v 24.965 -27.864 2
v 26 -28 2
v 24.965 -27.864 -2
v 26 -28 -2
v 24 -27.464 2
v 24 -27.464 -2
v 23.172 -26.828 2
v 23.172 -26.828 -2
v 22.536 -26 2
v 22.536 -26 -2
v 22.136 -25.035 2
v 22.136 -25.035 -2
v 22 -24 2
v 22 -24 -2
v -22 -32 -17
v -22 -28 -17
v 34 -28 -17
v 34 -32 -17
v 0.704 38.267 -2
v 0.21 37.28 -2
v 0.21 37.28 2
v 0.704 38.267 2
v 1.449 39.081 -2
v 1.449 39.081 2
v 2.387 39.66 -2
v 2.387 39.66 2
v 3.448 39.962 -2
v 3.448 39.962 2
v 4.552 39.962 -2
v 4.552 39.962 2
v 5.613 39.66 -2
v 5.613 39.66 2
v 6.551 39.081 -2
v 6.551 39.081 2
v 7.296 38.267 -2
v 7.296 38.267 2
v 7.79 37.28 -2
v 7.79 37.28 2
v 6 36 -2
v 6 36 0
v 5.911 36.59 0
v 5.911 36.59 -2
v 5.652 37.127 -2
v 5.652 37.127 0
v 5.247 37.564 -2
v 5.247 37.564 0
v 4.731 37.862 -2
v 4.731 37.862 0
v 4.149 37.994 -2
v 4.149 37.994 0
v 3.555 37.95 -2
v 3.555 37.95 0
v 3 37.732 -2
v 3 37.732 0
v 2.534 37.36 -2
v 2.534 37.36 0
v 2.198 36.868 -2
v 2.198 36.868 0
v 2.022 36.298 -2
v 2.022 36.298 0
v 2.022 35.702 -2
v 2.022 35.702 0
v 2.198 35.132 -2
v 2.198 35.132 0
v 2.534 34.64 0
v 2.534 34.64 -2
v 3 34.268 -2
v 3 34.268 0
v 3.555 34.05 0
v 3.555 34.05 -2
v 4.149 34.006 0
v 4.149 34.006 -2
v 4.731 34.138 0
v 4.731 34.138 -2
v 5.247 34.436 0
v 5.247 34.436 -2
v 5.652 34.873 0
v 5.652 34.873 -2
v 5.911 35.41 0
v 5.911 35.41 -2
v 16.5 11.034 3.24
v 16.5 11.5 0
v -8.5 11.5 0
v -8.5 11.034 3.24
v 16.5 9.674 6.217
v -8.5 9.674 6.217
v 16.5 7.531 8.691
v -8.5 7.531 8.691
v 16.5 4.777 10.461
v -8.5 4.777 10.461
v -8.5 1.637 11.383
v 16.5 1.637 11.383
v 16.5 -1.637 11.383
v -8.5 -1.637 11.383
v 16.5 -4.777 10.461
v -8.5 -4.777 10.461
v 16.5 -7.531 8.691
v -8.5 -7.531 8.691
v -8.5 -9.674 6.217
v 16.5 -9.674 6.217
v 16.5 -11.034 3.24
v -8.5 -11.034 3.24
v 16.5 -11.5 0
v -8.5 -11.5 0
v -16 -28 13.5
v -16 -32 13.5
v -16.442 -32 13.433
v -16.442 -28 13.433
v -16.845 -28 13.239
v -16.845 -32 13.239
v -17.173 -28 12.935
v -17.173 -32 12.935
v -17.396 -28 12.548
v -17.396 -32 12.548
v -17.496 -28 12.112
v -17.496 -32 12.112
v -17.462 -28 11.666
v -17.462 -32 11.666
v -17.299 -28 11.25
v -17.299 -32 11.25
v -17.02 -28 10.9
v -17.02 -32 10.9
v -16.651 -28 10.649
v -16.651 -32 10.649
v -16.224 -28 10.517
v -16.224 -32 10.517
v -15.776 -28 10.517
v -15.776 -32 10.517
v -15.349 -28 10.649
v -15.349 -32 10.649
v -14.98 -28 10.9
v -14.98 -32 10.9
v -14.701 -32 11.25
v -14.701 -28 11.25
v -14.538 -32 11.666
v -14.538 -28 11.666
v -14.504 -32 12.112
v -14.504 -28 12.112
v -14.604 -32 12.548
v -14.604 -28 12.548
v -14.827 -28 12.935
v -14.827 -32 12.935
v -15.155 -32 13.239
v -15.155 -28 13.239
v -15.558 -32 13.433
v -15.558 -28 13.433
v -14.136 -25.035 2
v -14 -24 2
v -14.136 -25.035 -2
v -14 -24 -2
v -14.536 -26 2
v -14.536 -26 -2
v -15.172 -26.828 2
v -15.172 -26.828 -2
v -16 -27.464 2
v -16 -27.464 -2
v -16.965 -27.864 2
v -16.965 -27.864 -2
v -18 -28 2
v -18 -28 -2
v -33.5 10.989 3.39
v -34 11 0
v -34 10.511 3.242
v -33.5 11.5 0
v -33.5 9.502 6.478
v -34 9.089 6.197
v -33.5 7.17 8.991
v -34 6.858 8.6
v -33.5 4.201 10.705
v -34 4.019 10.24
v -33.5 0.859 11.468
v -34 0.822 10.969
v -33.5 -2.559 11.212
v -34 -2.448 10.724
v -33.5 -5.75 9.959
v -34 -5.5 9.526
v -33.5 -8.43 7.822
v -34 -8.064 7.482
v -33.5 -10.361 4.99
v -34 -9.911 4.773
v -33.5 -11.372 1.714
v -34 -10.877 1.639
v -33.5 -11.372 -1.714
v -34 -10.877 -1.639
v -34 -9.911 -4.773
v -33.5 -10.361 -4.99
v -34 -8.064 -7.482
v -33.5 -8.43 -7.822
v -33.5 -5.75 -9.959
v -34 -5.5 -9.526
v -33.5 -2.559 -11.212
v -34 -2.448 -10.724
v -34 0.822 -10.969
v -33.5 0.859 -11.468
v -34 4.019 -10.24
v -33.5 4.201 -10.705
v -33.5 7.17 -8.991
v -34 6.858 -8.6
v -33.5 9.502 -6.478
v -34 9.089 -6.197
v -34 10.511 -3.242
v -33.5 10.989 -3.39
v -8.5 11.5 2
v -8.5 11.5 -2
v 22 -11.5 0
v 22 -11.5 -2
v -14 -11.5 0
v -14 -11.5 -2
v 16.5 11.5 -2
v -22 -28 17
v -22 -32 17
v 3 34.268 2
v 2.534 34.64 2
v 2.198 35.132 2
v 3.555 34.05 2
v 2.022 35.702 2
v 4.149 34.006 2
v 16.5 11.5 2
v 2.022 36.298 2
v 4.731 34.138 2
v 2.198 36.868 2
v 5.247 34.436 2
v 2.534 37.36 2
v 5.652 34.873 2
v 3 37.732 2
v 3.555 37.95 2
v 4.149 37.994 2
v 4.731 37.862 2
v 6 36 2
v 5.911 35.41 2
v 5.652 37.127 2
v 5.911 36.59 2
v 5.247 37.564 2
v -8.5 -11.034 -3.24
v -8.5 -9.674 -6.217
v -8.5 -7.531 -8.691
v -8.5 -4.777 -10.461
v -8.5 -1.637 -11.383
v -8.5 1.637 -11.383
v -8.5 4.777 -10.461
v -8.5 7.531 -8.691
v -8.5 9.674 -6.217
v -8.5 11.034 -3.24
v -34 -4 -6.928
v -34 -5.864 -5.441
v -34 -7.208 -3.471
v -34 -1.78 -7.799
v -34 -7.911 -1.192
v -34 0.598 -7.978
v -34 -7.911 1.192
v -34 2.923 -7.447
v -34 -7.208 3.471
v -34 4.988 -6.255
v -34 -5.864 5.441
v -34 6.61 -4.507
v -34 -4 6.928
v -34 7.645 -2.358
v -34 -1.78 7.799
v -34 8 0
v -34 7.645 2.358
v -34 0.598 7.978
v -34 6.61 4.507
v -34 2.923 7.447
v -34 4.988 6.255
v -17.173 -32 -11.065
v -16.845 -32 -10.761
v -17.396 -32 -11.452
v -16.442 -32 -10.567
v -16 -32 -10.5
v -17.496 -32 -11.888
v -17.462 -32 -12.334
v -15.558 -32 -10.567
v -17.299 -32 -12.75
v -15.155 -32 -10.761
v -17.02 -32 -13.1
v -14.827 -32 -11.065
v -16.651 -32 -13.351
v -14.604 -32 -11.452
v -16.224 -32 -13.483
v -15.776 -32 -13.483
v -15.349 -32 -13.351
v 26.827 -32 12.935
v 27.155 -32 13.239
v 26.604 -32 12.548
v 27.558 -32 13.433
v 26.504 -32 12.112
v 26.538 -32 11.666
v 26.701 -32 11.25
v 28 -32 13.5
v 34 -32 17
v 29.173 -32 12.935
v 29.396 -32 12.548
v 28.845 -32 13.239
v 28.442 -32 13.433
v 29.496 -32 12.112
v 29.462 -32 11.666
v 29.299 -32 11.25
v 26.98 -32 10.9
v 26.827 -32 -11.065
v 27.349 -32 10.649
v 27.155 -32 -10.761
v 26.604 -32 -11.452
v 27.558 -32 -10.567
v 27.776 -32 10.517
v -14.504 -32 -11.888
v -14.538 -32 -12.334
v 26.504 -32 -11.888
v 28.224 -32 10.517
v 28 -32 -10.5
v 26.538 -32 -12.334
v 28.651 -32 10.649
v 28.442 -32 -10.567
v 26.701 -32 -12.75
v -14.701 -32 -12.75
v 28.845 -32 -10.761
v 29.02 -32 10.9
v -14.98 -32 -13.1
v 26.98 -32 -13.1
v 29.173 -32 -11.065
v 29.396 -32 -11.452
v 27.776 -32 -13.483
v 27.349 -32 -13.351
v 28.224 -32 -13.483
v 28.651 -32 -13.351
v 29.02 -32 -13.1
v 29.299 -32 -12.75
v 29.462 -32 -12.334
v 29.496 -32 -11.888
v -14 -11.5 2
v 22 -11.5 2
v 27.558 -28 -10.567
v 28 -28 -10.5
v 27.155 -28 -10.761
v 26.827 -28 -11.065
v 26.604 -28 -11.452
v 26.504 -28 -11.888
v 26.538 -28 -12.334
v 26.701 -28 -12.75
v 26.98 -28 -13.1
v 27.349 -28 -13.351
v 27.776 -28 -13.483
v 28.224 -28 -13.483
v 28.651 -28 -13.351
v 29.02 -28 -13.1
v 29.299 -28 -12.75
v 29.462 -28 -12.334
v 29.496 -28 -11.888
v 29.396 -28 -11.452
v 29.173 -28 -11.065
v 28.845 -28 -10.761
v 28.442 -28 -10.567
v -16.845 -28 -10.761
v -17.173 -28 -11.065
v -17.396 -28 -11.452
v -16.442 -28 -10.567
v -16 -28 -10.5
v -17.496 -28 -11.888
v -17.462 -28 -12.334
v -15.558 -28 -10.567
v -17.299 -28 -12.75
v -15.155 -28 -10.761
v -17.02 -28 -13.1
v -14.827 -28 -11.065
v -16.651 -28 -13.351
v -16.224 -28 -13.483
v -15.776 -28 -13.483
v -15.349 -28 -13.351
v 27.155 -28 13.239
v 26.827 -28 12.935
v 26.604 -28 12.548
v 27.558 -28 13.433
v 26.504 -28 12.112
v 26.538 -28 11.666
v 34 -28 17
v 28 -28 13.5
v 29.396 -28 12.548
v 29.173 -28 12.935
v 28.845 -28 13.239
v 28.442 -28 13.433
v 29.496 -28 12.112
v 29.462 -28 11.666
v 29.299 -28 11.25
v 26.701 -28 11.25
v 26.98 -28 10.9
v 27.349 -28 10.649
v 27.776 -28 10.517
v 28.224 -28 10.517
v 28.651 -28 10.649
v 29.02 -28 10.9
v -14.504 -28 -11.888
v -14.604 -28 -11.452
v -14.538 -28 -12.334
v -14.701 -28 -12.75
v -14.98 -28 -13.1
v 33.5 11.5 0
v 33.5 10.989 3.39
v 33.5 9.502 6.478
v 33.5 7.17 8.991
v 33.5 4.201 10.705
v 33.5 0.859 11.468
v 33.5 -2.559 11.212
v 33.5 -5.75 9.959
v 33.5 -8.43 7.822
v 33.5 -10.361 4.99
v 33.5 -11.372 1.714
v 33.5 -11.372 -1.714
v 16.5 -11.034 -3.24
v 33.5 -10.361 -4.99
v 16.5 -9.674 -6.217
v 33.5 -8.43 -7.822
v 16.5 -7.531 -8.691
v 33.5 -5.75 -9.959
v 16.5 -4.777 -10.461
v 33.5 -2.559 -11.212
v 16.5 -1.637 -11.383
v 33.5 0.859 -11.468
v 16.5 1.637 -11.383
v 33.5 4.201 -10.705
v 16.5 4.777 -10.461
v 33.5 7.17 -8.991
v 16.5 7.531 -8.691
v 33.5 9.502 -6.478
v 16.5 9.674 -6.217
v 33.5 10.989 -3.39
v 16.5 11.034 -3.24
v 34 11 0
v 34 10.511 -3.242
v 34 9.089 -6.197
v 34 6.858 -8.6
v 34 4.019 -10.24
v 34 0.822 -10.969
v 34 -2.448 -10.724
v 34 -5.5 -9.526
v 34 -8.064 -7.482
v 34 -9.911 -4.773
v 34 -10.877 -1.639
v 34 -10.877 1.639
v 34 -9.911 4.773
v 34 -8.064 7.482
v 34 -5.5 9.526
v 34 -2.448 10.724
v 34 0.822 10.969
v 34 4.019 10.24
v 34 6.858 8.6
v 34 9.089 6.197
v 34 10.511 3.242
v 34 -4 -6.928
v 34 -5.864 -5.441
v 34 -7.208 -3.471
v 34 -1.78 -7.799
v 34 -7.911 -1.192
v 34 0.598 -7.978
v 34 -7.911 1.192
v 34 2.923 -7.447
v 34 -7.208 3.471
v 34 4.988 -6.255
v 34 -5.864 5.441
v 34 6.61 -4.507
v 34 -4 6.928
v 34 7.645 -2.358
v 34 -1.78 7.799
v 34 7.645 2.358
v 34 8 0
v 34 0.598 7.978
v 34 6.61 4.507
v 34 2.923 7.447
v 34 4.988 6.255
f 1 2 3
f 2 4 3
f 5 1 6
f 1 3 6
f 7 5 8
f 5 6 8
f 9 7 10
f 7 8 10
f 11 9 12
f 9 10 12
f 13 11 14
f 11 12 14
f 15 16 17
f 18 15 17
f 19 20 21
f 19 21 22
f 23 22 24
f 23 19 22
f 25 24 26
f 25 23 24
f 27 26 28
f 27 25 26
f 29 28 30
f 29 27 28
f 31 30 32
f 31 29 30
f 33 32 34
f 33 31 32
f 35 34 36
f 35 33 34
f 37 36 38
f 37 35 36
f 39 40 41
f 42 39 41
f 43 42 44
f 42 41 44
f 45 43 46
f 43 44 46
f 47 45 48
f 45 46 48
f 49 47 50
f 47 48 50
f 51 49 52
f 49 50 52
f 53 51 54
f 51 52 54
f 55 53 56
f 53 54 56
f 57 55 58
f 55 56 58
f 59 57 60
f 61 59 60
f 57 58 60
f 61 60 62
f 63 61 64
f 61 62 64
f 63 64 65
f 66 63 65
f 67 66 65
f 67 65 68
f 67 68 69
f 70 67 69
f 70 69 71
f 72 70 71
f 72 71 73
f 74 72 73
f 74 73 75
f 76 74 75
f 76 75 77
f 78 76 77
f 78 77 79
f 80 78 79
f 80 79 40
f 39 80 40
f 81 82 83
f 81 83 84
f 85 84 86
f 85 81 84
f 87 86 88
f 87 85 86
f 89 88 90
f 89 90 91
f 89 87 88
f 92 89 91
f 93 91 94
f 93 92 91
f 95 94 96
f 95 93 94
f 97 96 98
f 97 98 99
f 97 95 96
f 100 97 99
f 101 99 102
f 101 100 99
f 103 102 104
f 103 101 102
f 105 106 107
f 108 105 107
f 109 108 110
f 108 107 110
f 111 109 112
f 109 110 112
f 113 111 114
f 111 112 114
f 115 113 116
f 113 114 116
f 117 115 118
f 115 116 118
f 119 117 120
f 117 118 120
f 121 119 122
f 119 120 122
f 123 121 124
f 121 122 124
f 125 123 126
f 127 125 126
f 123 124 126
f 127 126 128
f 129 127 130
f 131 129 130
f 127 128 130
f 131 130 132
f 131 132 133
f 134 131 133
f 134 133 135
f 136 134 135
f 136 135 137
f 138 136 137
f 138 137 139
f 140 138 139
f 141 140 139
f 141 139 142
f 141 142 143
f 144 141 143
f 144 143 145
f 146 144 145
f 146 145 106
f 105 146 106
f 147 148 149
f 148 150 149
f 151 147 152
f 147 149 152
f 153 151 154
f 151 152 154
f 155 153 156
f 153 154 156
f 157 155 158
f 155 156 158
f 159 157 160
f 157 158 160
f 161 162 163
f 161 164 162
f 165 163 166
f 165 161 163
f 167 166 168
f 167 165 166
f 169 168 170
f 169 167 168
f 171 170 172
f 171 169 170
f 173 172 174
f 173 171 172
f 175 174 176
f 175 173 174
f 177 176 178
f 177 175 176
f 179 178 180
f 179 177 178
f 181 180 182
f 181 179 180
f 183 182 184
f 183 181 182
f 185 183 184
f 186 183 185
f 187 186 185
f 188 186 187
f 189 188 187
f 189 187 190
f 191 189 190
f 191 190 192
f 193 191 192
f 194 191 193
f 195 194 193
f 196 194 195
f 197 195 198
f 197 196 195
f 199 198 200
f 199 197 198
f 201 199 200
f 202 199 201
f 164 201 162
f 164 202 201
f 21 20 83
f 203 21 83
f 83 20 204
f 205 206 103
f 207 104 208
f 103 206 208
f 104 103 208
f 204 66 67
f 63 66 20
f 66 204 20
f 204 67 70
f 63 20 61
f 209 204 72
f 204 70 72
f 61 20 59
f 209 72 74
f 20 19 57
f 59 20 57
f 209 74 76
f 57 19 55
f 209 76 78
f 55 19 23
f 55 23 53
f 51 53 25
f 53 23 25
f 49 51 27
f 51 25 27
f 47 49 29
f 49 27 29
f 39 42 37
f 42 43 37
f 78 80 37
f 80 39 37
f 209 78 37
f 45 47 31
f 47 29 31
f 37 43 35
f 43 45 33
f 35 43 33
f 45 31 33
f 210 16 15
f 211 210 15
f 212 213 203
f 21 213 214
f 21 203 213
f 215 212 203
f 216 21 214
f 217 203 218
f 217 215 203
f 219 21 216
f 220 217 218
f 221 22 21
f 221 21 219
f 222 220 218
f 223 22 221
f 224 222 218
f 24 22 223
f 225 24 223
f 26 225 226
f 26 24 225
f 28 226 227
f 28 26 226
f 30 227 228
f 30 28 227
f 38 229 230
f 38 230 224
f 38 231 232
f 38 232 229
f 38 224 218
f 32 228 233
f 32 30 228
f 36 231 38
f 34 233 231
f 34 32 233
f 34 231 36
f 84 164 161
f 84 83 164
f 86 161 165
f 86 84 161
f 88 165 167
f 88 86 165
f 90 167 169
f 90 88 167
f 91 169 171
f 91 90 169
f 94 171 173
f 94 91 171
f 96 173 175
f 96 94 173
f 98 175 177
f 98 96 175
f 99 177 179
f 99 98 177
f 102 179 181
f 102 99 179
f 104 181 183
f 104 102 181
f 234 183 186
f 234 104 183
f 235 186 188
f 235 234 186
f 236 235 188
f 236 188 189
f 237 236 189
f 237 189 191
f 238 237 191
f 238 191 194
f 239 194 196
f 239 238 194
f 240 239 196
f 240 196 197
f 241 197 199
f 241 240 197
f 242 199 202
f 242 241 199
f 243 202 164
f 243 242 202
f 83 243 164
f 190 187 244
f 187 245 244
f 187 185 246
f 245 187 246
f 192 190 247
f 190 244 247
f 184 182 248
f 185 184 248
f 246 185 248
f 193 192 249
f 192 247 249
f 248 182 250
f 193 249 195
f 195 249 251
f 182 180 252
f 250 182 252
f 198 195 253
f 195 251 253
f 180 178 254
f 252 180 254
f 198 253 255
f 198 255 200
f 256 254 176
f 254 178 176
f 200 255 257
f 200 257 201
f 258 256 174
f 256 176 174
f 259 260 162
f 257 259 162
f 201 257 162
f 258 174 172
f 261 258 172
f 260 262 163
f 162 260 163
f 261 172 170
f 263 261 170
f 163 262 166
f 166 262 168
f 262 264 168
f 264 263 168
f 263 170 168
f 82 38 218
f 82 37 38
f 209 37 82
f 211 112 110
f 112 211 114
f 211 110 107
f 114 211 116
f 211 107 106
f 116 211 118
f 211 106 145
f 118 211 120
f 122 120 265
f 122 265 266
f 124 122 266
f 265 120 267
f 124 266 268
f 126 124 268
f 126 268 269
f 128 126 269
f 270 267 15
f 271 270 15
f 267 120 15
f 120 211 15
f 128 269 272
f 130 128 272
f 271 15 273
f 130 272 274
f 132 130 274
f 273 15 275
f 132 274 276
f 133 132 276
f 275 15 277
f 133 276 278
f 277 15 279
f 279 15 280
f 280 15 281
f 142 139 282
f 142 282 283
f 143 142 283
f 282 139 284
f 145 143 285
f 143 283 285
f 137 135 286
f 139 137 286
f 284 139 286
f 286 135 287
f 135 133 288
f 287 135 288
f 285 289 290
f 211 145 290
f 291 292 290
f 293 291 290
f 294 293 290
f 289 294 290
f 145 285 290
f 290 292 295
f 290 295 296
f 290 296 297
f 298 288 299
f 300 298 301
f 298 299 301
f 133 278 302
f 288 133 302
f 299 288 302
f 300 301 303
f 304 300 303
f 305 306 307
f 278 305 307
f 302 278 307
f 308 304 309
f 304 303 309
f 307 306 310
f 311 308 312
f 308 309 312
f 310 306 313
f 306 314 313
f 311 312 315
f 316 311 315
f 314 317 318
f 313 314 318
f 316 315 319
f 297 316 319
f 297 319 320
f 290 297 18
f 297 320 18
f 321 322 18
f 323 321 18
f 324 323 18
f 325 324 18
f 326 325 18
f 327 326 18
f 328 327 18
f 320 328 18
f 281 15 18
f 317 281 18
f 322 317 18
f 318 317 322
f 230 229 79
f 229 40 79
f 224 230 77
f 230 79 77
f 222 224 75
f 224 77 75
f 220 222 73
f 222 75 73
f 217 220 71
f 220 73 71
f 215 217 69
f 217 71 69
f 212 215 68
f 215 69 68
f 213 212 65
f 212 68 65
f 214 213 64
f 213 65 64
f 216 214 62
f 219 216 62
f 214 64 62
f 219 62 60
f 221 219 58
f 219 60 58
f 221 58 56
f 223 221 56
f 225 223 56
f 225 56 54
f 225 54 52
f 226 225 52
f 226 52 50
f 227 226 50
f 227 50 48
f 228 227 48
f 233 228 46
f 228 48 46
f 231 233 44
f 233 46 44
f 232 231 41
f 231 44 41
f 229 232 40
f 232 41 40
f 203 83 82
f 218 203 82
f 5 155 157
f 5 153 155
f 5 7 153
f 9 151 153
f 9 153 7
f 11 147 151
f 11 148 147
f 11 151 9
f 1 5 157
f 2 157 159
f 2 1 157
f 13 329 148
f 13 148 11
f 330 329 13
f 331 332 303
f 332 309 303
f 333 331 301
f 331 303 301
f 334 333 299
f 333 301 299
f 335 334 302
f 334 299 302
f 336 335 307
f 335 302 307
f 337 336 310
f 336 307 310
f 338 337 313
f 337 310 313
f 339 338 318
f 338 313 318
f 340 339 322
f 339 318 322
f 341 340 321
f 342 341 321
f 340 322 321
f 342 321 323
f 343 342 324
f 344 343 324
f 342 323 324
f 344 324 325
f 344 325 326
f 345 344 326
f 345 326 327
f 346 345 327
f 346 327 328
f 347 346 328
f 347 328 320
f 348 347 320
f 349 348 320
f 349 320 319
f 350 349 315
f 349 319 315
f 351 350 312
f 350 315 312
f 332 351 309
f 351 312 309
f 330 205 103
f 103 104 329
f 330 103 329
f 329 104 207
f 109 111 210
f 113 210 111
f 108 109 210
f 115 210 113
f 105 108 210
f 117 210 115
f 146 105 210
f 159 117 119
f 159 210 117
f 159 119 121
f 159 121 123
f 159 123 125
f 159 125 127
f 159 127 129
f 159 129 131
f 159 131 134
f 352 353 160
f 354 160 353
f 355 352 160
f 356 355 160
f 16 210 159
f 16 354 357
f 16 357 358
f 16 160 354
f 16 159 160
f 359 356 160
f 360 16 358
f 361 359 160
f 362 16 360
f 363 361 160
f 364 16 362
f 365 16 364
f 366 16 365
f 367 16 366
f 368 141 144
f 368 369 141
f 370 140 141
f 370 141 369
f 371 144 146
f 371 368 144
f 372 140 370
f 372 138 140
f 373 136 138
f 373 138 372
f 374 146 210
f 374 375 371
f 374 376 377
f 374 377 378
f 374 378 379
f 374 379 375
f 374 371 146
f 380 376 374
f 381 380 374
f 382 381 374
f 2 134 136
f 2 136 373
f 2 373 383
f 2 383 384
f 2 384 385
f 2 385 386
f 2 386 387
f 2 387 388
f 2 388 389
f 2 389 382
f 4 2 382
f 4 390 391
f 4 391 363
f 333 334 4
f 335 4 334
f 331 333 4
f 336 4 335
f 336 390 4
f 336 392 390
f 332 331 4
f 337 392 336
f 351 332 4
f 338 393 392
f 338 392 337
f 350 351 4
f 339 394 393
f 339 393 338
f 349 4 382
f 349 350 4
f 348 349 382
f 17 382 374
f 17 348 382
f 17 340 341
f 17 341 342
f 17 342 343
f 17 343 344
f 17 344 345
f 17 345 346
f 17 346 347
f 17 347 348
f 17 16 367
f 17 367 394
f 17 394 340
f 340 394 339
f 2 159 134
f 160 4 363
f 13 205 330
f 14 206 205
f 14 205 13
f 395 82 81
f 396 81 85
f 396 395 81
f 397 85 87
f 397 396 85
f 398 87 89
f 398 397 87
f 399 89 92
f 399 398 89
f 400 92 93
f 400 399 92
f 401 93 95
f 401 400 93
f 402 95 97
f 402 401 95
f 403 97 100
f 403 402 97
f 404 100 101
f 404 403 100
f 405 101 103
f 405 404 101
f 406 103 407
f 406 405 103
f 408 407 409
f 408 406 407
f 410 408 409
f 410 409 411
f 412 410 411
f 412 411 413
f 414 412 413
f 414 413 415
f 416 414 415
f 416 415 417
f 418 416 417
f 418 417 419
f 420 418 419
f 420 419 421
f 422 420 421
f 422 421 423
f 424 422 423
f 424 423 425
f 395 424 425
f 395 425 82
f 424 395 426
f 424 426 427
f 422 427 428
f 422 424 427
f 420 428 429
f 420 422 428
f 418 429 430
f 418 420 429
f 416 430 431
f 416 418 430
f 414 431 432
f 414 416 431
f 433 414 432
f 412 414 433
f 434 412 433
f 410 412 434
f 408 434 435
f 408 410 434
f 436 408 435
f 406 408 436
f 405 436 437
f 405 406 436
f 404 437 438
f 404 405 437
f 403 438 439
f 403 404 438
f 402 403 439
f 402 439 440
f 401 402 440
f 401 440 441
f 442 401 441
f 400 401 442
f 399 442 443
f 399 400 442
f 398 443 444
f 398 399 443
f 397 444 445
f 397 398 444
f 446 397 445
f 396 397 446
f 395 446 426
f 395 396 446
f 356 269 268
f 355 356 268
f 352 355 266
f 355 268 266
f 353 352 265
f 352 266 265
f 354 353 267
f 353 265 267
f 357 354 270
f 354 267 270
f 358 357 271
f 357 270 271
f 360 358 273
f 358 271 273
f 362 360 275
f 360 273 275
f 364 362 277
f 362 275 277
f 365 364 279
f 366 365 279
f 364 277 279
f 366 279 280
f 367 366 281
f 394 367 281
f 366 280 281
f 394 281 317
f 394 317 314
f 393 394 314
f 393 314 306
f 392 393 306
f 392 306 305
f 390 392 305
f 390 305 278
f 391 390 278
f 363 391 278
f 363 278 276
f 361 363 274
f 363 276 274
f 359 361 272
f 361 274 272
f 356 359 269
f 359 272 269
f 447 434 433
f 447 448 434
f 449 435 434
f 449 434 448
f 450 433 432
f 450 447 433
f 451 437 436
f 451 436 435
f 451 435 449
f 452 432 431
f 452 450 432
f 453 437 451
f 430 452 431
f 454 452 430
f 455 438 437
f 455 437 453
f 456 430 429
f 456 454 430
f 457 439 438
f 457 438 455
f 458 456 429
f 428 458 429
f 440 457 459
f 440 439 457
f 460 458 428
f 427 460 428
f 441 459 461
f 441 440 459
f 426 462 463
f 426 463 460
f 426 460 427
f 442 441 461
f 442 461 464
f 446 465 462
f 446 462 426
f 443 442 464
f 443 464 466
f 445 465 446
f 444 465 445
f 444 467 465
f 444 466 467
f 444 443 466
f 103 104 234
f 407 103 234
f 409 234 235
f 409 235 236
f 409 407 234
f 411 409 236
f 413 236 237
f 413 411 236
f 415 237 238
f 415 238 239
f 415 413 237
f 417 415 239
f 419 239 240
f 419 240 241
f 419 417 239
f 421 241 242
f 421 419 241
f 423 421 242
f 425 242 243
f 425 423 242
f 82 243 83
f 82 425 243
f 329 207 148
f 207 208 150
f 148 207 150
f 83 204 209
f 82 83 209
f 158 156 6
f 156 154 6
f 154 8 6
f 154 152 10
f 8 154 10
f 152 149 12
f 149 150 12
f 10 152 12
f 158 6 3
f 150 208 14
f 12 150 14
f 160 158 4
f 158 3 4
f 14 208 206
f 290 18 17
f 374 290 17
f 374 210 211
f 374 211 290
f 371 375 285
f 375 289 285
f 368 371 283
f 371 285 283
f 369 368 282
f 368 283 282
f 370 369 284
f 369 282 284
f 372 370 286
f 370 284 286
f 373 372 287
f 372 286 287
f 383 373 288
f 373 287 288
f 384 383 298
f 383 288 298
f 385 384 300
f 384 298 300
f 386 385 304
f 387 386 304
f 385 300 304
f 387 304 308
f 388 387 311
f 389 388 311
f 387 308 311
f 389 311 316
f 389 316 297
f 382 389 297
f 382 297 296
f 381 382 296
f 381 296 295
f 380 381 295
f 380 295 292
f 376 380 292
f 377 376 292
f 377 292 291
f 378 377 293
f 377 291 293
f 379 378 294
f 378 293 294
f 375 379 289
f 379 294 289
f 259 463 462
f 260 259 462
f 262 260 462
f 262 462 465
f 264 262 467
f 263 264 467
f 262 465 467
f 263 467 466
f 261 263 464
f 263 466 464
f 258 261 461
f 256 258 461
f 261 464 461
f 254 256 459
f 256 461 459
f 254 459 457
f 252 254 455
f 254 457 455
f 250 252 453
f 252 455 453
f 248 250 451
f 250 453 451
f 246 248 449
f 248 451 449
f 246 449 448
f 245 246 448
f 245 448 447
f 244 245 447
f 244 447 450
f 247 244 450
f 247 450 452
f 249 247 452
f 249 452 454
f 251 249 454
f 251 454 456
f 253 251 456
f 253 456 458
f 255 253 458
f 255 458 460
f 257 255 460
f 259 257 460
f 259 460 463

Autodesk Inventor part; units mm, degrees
ref_plane "YZ Plane" through (0, 0, 0) normal (1, 0, 0) x (0, 1, 0)
ref_plane "XZ Plane" through (0, 0, 0) normal (0, 1, 0) x (-1, 0, 0)
ref_plane "XY Plane" through (0, 0, 0) normal (0, 0, 1) x (1, 0, 0)
sketch "Boceto1" plane through (0, 0, 0) normal (0, 0, 1) x (1, 0, 0)
  line L0 (0, 31.2124) -> (0, -31.2124) construction
  line L1 (-43.2332, 0) -> (43.2332, 0)
  line L2 (-34, 11.5) -> (34, 11.5)
  line L3 (34, -11.5) -> (-34, -11.5)
  line L4 (-34, 8) -> (34, 8)
  arc A0 (7.7895, 37.2804) -> (0.2105, 37.2804) centre (4, 36) ccw
  circle A1 centre (4, 36) radius 2
  line L5 (0.4937, 38.1188) -> (-8.5, 11.5)
  line L6 (7.7895, 37.2804) -> (16.5, 11.5)
  line L7 (-14, -11.5) -> (-14, -24)
  line L8 (22, -11.5) -> (22, -24)
  line L9 (-14, -28) -> (22, -28)
  line L10 (-22, -28) -> (34, -28)
  line L11 (-22, -28) -> (-22, -32)
  line L12 (-22, -32) -> (34, -32)
  line L13 (34, -32) -> (34, -28)
  arc A2 (-18, -28) -> (-14, -24) centre (-18, -24) ccw
  arc A3 (22, -24) -> (26, -28) centre (26, -24) ccw
  line L14 (4, 46.9888) -> (4, 11.5)
  line L15 (-34, 11.5) -> (-34, 8)
  line L16 (34, 11.5) -> (34, 8)
  point P0 (0, 0)
  point P1 (0, 0)
  point P2 (0, 11.5)
  point P3 (22, -28)
  dimension "d0" = 23
  dimension "d1" = 68
  dimension "d2" = 23
  dimension "d3" = 16
  dimension "d4" = 30
  dimension "d5" = 8
  dimension "d6" = 4
  dimension "d10" = 24.5
  dimension "d11" = 12
  dimension "d12" = 20
  dimension "d13" = 16.5
  dimension "d14" = 16.5
  dimension "d15" = 56
  dimension "d16" = 0
  dimension "d17" = 4
  dimension "d20" = 4
  dimension "d24" = 56
  dimension "d27" = 9.322
  dimension "d28" = 12.5
  dimension "d29" = 12.5
  dimension "d30" = 30
  dimension "d31" = 9.2332
  dimension "d32" = 0
  dimension "d33" = 0.4825
  dimension "d34" = 33.5063
  dimension "d35" = 68
extrude "Extrusión1" add sketch "Boceto1" along normal blind 2 and the other way blind 2 contours L5 A0 L14 A1 L2 | L14 A1 A0 L6 L2
extrude "Extrusión2" add sketch "Boceto1" along normal blind 2 and the other way blind 2 contours L8 A3 L10 L9 A2 L7 L3
extrude "Extrusión3" add sketch "Boceto1" along normal blind 17 and the other way blind 17 contours L10 L13 L12 L11 L9
sketch "Boceto2" plane through (0, 0, 0) normal (0, 0, 1) x (1, 0, 0)
  line L0 (-8.5, 11.5) -> (16.5, 11.5) projected
  line L1 (16.5, 11.5) -> (-8.5, 11.5) projected
  line L2 (-8.5, 11.5) -> (16.5, 11.5) projected
  line L3 (16.5, 11.5) -> (-8.5, 11.5) projected
  line L4 (34, 11.5) -> (34, 8) projected
  line L5 (-34, 11.5) -> (34, 11.5) projected
  line L6 (-34, 8) -> (34, 8) projected
  line L7 (-34, 11.5) -> (-34, 8) projected
  line L8 (0, 31.2124) -> (0, -31.2124) construction
  line L9 (-43.2332, 0) -> (43.2332, 0) projected
  line L10 (-34, 11.5) -> (34, 11.5)
  line L11 (34, 11.5) -> (34, 8)
  line L12 (34, 8) -> (-34, 8)
  line L13 (-34, 8) -> (-34, 11.5)
  point P0 (0, 0)
  point P1 (0, 0)
  point P2 (0, 0)
  point P3 (0, 11.5)
  point P4 (-8.5, 11.5)
  point P5 (16.5, 11.5)
  point P6 (4, 11.5)
  dimension "d50" = 23
revolve "Revolución2" add sketch "Boceto2" angle 360 about axis through (-43.2332, 0, 0) along (1, 0, 0)
sketch "Boceto4" plane through (-22, -28, 17) normal (0, 1, 0) x (1, 0, 0)
  line L0 (56, 34) -> (56, 0) projected
  line L1 (56, 17) -> (0, 17)
  line L2 (0, 34) -> (0, 0) projected
  point P0 (22, 17)
  point P1 (50, 5)
  point P2 (50, 29)
  point P3 (6, 29)
  point P4 (6, 5)
  dimension "d54" = 6
  dimension "d55" = 12
  dimension "d56" = 6
  dimension "d57" = 12
  dimension "d58" = 6
  dimension "d59" = 12
  dimension "d60" = 6
  dimension "d61" = 12
hole "Agujero1" at (28, -28, 12) at (28, -28, -12) at (-16, -28, -12) at (-16, -28, 12) direction (0, -1, 0) diameter 3 end through all
chamfer "Chaflán1" distance 0.5 angle 45 1 edges at (34, -11.5, 0)
chamfer "Chaflán2" distance 0.5 angle 45 1 edges at (-34, -11.5, 0)
equation "\"d14\" = d13"
equation "\"d56\" = d54"
equation "\"d57\" = d55"
equation "\"d58\" = d56"
equation "\"d59\" = d57"
equation "\"d60\" = d58"
equation "\"d61\" = d59"
properties part number "1 HUDSON-8-28A-TDR HAND PUMP BASE BODY"
